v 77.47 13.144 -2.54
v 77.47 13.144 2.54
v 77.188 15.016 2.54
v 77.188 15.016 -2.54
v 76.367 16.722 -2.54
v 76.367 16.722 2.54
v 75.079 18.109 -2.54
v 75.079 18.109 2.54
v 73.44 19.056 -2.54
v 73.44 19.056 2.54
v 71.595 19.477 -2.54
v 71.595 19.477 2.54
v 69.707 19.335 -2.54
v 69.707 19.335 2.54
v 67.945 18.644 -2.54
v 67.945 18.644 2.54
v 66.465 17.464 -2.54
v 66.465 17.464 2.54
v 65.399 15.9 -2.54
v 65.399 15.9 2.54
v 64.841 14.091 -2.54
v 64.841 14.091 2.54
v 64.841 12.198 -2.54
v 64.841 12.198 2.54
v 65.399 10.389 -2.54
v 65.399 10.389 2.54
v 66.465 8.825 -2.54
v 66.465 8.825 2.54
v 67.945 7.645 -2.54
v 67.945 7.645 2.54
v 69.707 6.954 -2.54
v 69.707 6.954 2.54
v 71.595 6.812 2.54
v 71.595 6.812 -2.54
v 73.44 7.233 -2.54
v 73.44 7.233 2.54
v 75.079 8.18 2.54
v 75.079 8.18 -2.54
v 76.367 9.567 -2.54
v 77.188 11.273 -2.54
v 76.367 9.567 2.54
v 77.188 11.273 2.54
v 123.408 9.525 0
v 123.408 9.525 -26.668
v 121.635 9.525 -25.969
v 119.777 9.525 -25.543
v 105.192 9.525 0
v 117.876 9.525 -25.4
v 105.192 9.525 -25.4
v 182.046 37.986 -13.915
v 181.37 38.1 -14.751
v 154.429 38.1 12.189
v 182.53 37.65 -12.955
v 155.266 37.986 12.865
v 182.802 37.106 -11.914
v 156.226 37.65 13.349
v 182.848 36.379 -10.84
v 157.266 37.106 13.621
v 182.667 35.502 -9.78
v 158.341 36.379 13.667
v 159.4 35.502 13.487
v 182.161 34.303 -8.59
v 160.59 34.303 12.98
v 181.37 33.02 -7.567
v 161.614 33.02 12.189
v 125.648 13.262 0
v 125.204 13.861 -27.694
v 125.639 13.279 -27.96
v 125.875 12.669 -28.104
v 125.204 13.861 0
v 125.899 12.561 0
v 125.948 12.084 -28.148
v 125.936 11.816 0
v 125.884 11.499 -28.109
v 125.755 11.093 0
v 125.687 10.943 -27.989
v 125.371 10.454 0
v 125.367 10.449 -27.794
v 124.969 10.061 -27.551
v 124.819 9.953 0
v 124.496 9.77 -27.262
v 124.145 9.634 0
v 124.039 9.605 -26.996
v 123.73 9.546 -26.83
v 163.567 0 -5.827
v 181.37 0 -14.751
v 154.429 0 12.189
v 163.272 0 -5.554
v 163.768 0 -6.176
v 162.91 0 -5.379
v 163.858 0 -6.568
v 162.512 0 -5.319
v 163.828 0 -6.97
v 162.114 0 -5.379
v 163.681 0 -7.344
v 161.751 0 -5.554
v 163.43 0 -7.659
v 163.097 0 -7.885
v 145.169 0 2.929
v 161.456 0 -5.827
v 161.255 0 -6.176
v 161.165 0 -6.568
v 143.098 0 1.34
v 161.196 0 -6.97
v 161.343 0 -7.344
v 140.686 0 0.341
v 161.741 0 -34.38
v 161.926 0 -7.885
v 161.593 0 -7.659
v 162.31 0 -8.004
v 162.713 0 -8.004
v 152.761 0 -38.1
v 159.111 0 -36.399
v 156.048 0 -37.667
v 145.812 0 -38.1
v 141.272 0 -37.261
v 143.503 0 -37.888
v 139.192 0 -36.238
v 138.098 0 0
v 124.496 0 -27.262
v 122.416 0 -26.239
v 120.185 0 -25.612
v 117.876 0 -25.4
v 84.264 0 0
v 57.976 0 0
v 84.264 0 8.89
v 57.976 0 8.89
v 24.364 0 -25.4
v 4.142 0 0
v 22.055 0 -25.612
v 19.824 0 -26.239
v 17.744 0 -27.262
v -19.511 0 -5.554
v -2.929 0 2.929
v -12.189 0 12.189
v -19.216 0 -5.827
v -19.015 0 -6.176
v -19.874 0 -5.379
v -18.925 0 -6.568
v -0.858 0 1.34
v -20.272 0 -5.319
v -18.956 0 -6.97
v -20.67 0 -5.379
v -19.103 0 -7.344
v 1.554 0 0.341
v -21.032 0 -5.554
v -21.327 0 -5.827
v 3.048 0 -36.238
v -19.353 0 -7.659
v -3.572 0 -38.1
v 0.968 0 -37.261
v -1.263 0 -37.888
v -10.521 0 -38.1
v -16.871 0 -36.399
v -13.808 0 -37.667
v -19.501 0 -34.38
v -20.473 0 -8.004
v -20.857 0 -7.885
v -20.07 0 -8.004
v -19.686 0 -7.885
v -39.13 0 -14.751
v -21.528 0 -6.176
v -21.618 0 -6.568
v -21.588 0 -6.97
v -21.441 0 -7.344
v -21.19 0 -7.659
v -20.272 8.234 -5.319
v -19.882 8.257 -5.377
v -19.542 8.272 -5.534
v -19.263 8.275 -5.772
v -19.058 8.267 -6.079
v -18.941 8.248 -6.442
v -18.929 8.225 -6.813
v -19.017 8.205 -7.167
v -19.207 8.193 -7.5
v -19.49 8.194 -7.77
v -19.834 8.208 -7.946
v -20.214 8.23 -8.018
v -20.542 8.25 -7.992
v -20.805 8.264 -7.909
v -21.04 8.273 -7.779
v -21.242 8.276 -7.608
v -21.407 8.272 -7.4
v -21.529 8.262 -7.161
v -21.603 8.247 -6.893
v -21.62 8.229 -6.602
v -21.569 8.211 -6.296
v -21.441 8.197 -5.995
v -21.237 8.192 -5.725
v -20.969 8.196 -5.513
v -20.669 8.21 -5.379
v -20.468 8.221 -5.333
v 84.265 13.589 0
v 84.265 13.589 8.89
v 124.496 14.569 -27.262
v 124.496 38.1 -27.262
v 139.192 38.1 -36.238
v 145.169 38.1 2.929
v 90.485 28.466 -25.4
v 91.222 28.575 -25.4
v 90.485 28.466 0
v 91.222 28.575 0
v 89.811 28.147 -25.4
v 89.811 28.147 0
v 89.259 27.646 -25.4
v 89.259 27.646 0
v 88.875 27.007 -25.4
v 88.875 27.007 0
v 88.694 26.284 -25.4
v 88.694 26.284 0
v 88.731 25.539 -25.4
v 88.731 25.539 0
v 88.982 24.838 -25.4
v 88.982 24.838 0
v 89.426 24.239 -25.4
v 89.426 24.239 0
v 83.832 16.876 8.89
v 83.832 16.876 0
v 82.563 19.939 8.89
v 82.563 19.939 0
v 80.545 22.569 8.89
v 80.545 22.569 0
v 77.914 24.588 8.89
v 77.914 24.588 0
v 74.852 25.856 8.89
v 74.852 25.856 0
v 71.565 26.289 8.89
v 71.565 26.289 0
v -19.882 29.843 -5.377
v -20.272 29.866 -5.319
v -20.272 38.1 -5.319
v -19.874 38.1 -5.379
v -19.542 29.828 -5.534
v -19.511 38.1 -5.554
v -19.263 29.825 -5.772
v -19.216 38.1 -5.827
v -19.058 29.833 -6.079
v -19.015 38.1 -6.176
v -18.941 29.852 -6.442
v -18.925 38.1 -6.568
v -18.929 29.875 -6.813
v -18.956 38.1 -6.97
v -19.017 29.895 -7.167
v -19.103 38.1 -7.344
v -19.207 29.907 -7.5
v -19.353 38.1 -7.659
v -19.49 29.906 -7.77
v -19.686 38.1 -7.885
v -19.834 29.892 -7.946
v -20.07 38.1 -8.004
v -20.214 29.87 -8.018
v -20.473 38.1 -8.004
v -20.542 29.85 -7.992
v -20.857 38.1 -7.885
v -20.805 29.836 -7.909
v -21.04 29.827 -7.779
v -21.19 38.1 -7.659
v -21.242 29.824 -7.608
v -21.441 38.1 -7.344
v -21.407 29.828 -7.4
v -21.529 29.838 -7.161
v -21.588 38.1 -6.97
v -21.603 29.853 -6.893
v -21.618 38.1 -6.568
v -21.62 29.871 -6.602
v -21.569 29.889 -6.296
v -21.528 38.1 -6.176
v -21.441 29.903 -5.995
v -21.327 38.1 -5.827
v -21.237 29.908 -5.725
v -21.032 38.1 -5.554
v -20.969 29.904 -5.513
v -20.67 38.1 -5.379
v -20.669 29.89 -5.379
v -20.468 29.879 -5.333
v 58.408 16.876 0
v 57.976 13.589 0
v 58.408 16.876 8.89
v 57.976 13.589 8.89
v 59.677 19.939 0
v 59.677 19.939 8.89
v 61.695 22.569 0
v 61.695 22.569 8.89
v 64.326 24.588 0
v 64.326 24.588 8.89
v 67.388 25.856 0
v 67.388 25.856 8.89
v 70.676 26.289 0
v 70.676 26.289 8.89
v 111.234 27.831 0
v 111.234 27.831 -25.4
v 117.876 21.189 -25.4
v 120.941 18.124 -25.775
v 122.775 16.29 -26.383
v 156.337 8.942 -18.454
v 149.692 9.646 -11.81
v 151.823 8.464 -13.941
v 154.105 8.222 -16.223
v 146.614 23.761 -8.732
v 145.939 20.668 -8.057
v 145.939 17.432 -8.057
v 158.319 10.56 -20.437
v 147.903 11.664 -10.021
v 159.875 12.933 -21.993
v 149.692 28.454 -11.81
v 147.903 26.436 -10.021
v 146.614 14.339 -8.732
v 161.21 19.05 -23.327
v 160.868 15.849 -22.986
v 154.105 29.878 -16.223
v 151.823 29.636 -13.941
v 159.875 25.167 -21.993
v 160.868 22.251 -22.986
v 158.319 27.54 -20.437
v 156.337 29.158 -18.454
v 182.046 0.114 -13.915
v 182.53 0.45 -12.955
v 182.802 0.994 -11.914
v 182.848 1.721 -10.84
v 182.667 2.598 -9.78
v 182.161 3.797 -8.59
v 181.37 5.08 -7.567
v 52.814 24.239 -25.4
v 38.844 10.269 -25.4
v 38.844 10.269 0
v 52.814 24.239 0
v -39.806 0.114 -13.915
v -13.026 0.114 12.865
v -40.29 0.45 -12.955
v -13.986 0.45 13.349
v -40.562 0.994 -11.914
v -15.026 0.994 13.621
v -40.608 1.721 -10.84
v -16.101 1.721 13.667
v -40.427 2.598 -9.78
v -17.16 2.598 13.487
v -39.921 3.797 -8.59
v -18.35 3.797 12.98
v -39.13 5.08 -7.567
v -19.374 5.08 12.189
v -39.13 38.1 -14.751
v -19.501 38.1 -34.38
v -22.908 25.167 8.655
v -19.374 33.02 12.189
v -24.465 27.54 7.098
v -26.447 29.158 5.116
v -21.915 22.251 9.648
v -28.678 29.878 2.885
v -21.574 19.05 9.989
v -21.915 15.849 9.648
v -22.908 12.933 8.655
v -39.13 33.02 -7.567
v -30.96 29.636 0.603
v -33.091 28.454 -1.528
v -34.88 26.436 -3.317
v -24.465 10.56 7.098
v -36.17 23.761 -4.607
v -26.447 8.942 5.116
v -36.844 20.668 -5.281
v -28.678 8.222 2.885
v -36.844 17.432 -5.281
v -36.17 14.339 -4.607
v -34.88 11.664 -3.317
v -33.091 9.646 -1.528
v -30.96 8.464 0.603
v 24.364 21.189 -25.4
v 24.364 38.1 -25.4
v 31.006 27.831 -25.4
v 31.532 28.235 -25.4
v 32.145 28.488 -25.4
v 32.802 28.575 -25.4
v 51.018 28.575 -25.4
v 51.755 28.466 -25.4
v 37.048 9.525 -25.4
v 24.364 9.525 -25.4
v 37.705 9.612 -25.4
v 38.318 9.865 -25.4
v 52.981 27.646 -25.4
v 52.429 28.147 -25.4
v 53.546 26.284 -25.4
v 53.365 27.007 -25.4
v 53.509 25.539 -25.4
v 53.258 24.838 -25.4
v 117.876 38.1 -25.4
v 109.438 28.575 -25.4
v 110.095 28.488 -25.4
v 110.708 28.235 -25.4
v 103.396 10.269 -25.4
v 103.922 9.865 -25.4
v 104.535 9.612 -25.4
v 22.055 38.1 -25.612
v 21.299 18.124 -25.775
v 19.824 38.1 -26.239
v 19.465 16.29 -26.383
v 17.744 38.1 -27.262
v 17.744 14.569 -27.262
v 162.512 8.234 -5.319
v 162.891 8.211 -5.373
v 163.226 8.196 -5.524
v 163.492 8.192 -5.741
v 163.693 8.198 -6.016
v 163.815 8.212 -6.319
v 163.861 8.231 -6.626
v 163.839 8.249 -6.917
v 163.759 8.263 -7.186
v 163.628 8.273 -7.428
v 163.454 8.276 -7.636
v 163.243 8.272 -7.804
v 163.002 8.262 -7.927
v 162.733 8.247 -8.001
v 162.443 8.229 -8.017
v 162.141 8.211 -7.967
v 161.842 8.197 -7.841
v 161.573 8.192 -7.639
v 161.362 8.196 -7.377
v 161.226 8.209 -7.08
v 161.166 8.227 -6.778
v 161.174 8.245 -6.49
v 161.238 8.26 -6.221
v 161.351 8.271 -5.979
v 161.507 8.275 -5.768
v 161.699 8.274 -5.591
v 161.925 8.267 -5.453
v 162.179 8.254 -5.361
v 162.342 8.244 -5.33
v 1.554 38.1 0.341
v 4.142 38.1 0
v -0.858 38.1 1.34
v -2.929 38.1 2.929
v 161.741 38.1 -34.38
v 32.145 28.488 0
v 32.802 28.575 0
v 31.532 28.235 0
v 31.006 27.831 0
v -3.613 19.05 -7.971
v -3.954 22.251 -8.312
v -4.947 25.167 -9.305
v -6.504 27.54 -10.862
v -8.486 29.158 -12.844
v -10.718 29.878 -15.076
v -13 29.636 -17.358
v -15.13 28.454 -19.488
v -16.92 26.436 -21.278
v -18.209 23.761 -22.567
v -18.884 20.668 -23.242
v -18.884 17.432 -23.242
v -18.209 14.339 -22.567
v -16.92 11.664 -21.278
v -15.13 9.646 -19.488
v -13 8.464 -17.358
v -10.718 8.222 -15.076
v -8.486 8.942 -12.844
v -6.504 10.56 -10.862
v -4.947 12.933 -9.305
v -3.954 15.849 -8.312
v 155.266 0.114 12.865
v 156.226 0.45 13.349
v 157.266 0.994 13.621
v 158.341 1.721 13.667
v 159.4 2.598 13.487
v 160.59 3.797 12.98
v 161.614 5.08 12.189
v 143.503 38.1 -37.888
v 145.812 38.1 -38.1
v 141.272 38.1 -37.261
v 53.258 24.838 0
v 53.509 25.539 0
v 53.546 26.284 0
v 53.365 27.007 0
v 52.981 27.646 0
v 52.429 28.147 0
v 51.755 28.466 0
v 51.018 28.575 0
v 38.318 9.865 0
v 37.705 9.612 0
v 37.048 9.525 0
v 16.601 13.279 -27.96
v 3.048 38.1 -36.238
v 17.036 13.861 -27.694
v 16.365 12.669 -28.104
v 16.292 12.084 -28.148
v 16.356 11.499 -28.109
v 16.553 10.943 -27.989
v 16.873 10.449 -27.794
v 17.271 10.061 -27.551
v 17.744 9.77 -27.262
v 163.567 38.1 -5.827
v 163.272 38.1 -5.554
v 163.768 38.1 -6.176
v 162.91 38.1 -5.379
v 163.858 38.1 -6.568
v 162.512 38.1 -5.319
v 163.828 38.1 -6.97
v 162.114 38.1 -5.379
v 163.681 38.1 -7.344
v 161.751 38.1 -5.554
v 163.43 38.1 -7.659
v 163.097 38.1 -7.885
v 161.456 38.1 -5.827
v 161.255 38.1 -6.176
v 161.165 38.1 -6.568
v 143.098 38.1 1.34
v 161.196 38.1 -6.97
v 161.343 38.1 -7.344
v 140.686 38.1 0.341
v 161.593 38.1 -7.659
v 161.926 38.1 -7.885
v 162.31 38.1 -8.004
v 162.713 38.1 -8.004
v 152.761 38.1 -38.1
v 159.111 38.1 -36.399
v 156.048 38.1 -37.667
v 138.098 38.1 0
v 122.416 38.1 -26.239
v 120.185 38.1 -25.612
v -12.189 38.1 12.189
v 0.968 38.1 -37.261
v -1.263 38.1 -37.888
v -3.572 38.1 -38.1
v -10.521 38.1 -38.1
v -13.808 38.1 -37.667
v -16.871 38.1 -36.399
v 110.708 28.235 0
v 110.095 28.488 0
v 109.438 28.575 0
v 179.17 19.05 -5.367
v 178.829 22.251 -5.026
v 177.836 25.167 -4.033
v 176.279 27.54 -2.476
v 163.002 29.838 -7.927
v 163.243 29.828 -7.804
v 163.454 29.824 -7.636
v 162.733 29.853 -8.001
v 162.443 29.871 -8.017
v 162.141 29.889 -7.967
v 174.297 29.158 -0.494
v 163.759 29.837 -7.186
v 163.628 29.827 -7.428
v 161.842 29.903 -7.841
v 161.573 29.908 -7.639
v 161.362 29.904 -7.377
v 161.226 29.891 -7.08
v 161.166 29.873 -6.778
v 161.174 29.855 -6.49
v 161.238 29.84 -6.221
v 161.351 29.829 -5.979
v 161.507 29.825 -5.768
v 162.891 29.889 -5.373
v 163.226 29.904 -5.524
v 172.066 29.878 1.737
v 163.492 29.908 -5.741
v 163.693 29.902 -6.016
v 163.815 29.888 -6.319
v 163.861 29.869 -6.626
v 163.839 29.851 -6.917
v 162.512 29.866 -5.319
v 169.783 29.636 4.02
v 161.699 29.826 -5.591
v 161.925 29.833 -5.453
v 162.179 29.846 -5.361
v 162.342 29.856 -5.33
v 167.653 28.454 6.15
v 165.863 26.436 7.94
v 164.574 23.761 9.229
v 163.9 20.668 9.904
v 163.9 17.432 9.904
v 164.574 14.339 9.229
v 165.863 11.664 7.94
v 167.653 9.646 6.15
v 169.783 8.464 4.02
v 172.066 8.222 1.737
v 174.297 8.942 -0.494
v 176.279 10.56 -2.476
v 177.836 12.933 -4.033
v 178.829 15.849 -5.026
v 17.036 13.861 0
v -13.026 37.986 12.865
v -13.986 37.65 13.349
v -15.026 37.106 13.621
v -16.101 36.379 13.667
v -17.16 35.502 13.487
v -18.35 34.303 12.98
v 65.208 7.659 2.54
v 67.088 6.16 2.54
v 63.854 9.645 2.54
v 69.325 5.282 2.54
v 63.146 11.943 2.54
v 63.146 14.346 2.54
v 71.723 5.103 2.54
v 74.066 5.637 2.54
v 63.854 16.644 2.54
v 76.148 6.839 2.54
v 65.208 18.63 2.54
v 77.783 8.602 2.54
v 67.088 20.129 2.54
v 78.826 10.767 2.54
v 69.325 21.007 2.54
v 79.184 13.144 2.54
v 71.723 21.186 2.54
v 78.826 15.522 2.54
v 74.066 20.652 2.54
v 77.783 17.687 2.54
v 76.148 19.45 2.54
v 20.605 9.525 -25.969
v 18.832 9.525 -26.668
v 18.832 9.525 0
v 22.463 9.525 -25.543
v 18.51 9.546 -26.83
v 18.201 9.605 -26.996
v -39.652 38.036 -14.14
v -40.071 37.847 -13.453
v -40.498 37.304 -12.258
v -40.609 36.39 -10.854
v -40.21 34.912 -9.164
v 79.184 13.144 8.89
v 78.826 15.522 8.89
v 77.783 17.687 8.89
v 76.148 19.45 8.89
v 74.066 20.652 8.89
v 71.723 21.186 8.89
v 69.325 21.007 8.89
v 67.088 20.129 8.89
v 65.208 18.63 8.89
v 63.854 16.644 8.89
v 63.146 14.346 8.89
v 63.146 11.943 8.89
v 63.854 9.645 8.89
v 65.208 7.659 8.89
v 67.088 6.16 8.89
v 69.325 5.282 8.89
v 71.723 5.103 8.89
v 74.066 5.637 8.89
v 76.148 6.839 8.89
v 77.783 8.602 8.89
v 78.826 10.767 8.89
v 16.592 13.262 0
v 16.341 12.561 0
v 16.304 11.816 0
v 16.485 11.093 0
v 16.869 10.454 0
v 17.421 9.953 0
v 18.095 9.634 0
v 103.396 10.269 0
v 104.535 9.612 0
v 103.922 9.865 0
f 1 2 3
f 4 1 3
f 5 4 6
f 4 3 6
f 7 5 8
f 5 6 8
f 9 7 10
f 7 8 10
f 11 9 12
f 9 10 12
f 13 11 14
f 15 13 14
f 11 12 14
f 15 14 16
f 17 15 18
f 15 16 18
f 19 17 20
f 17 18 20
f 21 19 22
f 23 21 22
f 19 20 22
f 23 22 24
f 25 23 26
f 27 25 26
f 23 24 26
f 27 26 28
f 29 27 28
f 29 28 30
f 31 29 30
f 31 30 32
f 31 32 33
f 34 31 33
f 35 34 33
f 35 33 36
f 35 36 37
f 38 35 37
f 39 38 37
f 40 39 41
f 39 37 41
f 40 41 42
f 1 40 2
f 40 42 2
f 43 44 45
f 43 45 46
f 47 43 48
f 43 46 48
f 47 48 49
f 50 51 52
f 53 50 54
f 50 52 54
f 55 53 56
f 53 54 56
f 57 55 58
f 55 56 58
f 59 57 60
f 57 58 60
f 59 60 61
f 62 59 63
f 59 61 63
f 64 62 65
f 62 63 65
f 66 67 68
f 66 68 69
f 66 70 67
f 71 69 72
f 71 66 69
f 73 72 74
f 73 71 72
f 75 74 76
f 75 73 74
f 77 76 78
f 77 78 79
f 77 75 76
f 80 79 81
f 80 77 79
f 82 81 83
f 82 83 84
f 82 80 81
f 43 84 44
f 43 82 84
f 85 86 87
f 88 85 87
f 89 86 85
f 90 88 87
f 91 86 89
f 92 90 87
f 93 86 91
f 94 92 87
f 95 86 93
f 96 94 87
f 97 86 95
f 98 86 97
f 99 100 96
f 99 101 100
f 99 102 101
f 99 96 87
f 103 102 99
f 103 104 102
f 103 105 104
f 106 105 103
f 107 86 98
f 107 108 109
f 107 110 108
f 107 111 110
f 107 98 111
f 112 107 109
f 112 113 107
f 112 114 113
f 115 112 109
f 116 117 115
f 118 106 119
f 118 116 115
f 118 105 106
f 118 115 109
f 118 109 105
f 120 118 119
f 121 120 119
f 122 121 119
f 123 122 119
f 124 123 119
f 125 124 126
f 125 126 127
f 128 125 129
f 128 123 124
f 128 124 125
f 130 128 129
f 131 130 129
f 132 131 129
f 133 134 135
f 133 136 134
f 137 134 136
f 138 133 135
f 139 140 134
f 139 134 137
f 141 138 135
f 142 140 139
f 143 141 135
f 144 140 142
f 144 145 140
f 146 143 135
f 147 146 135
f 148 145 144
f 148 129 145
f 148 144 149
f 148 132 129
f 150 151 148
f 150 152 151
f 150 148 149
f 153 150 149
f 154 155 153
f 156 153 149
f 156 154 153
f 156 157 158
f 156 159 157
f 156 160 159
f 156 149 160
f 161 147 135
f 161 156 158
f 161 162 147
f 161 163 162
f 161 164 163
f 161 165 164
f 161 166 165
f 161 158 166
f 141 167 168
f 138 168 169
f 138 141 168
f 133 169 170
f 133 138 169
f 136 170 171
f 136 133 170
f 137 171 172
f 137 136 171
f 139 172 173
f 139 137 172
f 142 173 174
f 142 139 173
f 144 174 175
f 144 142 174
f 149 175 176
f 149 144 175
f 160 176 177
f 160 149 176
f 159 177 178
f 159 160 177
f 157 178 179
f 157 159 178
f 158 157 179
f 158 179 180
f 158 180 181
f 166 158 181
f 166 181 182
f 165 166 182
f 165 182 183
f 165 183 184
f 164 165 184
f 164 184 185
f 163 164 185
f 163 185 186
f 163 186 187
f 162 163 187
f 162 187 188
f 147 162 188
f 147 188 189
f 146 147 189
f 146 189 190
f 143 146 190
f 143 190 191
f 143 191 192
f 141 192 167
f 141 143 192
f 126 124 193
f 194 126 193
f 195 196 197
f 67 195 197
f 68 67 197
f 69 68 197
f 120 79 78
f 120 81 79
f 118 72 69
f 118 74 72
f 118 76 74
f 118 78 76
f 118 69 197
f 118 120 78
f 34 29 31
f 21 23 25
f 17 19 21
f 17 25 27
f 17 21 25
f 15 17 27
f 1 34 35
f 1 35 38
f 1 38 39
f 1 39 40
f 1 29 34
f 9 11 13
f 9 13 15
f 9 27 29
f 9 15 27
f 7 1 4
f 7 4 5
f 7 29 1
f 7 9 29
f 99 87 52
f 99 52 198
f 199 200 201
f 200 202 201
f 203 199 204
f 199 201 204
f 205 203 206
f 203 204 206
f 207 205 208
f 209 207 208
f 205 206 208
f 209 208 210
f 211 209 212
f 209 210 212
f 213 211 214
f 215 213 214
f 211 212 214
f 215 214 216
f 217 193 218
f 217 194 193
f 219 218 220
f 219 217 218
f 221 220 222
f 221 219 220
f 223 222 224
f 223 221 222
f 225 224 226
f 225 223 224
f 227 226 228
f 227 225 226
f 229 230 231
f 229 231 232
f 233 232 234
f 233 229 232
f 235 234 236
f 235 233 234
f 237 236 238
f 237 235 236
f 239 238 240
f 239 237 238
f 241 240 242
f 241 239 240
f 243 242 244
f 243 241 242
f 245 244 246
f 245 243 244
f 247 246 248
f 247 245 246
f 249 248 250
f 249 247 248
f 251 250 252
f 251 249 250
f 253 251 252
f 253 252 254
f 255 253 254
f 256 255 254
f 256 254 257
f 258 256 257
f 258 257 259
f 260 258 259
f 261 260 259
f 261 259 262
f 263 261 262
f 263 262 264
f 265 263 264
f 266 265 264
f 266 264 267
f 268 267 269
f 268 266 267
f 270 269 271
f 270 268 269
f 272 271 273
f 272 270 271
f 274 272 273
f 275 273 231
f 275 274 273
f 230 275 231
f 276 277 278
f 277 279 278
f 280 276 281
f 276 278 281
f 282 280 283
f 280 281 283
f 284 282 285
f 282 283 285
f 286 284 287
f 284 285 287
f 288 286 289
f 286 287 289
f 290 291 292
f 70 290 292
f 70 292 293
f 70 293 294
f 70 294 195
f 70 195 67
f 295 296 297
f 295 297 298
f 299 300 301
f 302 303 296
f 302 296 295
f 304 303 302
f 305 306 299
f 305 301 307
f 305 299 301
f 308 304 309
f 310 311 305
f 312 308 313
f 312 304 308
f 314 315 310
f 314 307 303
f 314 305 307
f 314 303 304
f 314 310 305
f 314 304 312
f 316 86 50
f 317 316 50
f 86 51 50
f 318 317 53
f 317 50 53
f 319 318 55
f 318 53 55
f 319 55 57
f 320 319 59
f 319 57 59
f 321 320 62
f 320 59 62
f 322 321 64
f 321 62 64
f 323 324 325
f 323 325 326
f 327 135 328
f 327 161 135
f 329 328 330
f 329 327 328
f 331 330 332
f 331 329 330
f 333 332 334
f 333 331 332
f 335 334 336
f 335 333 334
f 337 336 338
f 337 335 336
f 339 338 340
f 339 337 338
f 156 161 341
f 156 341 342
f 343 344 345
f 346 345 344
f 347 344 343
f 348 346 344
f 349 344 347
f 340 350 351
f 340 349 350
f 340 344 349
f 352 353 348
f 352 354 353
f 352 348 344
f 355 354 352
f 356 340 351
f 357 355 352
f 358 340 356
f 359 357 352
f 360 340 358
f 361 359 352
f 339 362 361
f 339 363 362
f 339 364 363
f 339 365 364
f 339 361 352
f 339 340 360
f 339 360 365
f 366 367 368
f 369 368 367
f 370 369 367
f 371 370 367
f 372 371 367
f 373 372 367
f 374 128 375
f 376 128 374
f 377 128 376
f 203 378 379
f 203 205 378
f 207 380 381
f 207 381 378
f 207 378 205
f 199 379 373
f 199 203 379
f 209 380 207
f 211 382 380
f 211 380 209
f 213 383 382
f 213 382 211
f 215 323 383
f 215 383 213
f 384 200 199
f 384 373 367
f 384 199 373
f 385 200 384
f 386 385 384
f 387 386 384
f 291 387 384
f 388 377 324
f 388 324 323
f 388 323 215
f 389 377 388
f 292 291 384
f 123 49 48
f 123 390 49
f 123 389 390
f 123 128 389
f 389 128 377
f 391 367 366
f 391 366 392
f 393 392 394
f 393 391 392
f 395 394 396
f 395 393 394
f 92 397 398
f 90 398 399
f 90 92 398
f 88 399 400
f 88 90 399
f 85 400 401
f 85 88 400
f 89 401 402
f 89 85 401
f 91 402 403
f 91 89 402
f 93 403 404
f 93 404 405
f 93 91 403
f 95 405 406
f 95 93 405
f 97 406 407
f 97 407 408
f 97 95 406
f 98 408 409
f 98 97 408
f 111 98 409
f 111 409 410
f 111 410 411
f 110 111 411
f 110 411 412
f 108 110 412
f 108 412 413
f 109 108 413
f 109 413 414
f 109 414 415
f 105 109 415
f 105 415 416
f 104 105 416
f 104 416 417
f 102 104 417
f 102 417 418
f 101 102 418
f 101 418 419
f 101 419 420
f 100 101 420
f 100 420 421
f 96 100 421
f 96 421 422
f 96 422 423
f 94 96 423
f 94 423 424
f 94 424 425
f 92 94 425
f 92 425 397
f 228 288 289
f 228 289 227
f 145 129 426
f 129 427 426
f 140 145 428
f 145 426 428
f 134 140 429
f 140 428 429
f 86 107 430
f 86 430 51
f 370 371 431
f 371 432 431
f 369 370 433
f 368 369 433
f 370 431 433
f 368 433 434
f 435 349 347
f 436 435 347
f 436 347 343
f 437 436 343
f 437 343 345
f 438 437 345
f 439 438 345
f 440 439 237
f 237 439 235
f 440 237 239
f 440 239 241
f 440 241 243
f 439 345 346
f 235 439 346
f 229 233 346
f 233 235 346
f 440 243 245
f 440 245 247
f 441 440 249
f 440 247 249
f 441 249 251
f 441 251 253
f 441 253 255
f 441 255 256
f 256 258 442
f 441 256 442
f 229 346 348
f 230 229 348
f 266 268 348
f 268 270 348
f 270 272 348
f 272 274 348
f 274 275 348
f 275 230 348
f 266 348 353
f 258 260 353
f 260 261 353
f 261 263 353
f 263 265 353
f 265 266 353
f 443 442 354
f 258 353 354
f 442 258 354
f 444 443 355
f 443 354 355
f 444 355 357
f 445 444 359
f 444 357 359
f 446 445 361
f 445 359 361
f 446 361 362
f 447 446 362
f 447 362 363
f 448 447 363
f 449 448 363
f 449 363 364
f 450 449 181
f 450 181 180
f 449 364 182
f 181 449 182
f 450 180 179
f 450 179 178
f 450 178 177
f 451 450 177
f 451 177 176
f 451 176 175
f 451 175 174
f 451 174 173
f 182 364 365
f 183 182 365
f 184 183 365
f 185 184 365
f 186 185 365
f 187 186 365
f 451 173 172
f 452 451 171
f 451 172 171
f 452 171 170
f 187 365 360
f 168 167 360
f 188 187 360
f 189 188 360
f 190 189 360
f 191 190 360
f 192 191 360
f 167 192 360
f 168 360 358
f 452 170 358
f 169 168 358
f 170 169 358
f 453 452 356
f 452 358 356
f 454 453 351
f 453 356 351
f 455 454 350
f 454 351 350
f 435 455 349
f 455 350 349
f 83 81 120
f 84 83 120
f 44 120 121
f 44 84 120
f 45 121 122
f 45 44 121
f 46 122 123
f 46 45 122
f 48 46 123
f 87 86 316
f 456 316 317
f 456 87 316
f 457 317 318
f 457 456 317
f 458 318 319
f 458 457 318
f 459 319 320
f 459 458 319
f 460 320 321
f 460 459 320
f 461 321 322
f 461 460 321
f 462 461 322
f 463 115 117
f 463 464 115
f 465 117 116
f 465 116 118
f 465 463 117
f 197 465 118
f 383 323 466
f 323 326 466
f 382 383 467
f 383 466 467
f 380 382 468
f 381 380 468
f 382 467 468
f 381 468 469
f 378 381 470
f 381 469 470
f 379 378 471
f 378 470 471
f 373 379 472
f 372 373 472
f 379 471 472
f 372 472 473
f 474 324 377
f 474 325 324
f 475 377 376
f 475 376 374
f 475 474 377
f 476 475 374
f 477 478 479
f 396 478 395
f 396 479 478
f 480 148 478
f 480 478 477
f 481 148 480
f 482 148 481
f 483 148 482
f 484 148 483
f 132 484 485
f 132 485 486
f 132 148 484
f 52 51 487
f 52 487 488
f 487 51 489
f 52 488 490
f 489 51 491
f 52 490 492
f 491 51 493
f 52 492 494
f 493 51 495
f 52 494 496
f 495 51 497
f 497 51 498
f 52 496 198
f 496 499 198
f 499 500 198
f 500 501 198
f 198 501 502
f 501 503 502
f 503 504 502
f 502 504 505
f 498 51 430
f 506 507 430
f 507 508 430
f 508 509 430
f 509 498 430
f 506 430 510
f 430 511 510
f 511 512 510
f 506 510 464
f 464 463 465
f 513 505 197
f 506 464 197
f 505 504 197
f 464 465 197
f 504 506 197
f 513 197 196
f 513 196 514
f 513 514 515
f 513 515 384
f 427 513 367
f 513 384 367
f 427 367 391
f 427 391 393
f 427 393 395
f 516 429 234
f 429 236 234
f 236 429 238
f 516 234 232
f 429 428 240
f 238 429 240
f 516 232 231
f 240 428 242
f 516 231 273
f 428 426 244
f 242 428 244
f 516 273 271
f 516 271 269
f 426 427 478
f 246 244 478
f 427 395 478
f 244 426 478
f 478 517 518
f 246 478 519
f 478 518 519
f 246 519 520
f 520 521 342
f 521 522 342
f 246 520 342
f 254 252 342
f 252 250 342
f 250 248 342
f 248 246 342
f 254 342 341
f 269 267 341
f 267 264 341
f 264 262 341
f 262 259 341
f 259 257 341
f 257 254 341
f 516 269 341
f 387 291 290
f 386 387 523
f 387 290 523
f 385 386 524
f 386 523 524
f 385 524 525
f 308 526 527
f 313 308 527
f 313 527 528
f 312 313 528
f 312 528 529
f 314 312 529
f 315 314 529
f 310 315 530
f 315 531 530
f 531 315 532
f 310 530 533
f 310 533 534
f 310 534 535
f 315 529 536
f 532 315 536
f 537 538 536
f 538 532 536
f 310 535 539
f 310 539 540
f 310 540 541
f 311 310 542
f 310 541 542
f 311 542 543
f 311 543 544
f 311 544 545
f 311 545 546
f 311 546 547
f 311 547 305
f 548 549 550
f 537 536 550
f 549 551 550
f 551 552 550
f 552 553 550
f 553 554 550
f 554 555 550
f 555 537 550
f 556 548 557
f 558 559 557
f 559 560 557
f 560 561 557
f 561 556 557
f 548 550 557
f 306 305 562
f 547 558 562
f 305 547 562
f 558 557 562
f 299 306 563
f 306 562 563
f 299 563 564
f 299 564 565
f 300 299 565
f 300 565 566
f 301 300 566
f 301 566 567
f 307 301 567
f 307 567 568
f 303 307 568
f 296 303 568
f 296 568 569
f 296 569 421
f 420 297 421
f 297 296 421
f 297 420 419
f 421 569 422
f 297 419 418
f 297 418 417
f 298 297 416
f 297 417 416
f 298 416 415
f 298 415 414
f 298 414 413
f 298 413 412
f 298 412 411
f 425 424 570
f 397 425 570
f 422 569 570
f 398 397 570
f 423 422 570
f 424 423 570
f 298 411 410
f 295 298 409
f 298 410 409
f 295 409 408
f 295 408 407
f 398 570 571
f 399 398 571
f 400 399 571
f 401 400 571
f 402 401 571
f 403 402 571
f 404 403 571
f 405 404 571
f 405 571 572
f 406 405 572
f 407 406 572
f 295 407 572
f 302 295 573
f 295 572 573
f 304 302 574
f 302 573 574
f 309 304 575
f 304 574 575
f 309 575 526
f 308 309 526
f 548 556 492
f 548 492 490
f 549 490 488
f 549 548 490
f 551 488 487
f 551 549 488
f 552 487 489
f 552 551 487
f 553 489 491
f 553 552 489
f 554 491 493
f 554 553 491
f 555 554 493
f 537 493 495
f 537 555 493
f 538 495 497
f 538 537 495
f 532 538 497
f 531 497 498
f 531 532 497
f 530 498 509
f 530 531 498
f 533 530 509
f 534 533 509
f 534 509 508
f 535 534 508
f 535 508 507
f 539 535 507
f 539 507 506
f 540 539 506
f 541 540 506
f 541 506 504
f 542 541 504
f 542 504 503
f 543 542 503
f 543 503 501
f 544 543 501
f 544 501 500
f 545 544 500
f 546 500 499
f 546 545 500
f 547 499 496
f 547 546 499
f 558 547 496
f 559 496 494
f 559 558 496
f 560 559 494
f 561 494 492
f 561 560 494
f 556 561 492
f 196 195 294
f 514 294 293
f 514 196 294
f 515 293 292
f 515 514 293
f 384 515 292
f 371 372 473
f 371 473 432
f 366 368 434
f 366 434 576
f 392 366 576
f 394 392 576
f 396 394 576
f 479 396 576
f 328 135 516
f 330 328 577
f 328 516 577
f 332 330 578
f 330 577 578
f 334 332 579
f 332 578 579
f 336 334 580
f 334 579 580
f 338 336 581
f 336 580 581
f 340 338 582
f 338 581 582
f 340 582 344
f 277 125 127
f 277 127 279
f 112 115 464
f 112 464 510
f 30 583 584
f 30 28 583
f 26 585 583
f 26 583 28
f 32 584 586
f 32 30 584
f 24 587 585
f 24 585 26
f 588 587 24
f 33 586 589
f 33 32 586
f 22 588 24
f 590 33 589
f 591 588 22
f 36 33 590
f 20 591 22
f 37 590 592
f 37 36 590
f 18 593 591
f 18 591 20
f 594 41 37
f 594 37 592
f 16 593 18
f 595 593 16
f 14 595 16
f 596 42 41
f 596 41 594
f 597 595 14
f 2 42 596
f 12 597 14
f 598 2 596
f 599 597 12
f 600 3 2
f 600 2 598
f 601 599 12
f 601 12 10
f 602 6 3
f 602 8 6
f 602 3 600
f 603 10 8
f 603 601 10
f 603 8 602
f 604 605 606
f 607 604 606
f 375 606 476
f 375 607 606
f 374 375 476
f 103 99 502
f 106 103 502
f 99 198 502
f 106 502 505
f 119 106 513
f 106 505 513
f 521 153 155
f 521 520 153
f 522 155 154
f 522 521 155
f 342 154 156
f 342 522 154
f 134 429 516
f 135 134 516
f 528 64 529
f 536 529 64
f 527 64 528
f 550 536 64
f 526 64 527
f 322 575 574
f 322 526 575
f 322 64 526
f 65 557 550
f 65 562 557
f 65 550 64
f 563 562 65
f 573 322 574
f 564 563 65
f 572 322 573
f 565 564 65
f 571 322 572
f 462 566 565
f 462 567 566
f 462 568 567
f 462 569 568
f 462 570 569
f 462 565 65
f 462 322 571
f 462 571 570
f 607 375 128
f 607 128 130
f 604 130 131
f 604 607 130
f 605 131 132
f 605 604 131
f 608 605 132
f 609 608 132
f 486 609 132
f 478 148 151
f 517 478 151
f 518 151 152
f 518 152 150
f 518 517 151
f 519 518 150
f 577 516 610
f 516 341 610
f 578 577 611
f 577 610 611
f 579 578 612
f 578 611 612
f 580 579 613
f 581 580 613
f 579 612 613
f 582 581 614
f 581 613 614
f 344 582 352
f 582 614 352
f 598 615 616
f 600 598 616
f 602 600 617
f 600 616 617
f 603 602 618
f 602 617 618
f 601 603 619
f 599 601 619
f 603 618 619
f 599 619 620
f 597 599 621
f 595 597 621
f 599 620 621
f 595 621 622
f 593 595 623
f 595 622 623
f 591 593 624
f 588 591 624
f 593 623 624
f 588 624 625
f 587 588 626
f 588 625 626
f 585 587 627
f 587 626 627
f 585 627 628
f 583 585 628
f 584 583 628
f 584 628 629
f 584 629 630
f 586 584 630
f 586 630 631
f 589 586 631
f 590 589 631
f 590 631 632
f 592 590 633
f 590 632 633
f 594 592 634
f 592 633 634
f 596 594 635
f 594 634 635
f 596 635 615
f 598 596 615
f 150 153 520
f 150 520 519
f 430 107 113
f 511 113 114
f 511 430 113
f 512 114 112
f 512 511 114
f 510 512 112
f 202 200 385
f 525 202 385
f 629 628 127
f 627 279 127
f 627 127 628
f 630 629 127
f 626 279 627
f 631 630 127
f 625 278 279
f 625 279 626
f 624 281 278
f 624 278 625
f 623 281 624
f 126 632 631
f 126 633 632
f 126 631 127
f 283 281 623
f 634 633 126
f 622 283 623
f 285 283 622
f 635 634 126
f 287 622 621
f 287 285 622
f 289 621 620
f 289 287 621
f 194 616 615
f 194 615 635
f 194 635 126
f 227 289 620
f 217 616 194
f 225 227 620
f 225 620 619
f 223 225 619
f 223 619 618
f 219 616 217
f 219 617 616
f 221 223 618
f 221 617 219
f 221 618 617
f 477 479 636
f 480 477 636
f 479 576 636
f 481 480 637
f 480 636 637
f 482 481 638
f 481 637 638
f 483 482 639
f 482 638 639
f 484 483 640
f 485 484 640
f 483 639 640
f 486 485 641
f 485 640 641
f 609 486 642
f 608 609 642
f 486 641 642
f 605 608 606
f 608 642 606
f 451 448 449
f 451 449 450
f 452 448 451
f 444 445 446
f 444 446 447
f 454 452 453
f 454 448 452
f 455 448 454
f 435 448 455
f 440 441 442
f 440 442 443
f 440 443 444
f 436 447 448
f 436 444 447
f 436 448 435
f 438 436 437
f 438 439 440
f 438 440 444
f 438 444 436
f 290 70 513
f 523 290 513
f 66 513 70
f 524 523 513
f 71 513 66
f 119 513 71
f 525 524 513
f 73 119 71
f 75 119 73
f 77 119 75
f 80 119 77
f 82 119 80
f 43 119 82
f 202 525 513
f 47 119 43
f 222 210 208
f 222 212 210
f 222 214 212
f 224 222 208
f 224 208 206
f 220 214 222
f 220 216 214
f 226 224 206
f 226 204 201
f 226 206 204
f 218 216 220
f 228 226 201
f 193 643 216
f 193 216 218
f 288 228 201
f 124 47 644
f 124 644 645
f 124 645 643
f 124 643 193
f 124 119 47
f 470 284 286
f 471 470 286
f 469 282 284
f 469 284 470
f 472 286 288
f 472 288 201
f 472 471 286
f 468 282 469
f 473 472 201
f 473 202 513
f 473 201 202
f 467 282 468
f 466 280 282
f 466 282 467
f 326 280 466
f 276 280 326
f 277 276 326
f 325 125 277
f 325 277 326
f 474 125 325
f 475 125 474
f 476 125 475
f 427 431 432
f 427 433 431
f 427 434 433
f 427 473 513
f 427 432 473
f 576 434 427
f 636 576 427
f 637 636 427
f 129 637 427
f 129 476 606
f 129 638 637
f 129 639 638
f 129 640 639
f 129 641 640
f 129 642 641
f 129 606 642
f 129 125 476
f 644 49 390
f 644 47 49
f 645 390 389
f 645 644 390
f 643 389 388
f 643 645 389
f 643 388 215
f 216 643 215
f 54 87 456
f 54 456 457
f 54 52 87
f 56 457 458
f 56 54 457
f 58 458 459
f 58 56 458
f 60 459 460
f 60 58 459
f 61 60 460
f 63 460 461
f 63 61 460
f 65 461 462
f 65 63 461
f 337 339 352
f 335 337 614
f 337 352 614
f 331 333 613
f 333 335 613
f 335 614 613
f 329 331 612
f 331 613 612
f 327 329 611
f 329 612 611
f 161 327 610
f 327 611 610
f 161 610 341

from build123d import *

# Parameters (mm, degrees)
BOSS_EXTRUDE1_DEPTH     = 38.1
SKETCH2_R               = 10.8585
CUT_EXTRUDE1_DEPTH      = 25.4
SKETCH3_R               = 10.8585
CUT_EXTRUDE2_DEPTH      = 25.4
FILLET1_R               = 10
SKETCH5_W               = 26.289
SKETCH5_H               = 26.289
BOSS_EXTRUDE2_DEPTH     = 8.89
SKETCH6_R               = 8.0645
CUT_EXTRUDE3_DEPTH      = 6.35
SKETCH7_R               = 6.35
CUT_EXTRUDE4_DEPTH      = 5.08
FILLET3_R               = 12.7
FILLET4_R               = 5.08
FILLET5_R               = 12.7
CUT_EXTRUDE5_DEPTH      = 191.631332173
CUT_EXTRUDE5_DEPTH_BACK = 191.631332173
SKETCH8_R               = 1.349999967
CUT_EXTRUDE6_DEPTH      = 191.631332193
CUT_EXTRUDE6_DEPTH_BACK = 191.631332193
FILLET6_R               = 2.54


with BuildPart() as part:
    # Sketch1 → Boss-Extrude1 (new body)
    with BuildSketch(Plane(origin=(0, 0, 0), x_dir=(1, 0, 0), z_dir=(0, 1, 0))):
        Polygon((-15.781536726, 38.1), (0, 38.1), (20.791856291, 25.4), (121.448143709, 25.4), (142.24, 38.1), (158.021536726, 38.1), (184.96230509, 11.159231637), (158.021536726, -15.781536726), (142.24, 0), (0, 0), (-15.781536726, -15.781536726), (-42.72230509, 11.159231637), align=None)
    extrude(amount=BOSS_EXTRUDE1_DEPTH)

    # Sketch2 → Cut-Extrude1 (cut)
    with BuildSketch(Plane(origin=(-15.781536726, 0, 15.781536726), x_dir=(0.7071067811865477, 0, 0.7071067811865475), z_dir=(-0.7071067811865475, 0, 0.7071067811865477))):
        with Locations((-19.05, 19.05)):
            Circle(SKETCH2_R)
    extrude(amount=-CUT_EXTRUDE1_DEPTH, mode=Mode.SUBTRACT)

    # Sketch3 → Cut-Extrude2 (cut)
    with BuildSketch(Plane(origin=(86.901536726, 0, 86.901536726), x_dir=(0.7071067811865478, 0, -0.7071067811865474), z_dir=(0.7071067811865474, 0, 0.7071067811865478))):
        with Locations((119.628868556, 19.05)):
            Circle(SKETCH3_R)
    extrude(amount=-CUT_EXTRUDE2_DEPTH, mode=Mode.SUBTRACT)

    # Fillet1
    fillet1_edges = [part.edges().sort_by_distance(p)[0] for p in [
        (142.24, 19.05, 0),
        (0, 19.05, 0),
    ]]
    fillet(fillet1_edges, radius=FILLET1_R)

    # Sketch5 → Boss-Extrude2 (add)
    with BuildSketch(Plane.XY):
        with Locations((71.12, 13.1445)):
            Rectangle(SKETCH5_W, SKETCH5_H)
    extrude(amount=BOSS_EXTRUDE2_DEPTH)

    # Sketch6 → Cut-Extrude3 (cut)
    with BuildSketch(Plane.XY.offset(8.89)):
        with Locations((71.12, 13.1445)):
            Circle(SKETCH6_R)
    extrude(amount=-CUT_EXTRUDE3_DEPTH, mode=Mode.SUBTRACT)

    # Sketch7 → Cut-Extrude4 (cut)
    with BuildSketch(Plane.XY.offset(2.54)):
        with Locations((71.12, 13.1445)):
            Circle(SKETCH7_R)
    extrude(amount=-CUT_EXTRUDE4_DEPTH, mode=Mode.SUBTRACT)

    # Fillet3
    fillet3_edges = [part.edges().sort_by_distance(p)[0] for p in [
        (57.9755, 26.289, 4.445),
        (84.2645, 26.289, 4.445),
    ]]
    fillet(fillet3_edges, radius=FILLET3_R)

    # Fillet4
    fillet4_edges = [part.edges().sort_by_distance(p)[0] for p in [
        (-29.251920908, 0, 2.311152545),
        (171.491920908, 0, 2.311152545),
        (171.491920908, 38.1, 2.311152545),
        (-15.781536726, 19.05, 15.781536726),
        (-42.72230509, 19.05, -11.159231637),
        (184.96230509, 19.05, -11.159231637),
        (158.021536726, 19.05, 15.781536726),
        (-29.251920908, 38.1, 2.311152545),
    ]]
    fillet(fillet4_edges, radius=FILLET4_R)

    # Fillet5
    fillet5_edges = [part.edges().sort_by_distance(p)[0] for p in [
        (-15.781536726, 19.05, -38.1),
        (0, 19.05, -38.1),
        (20.791856291, 19.05, -25.4),
        (121.448143709, 19.05, -25.4),
        (142.24, 19.05, -38.1),
        (158.021536726, 19.05, -38.1),
    ]]
    fillet(fillet5_edges, radius=FILLET5_R)

    # Sketch8 → Cut-Extrude5 (cut, two sides: drawn at the far end of the back side and taken through both)
    with BuildSketch(Plane(origin=(0, 38.1, 0), x_dir=(1, 0, 0), z_dir=(0, 1, 0)).offset(-CUT_EXTRUDE5_DEPTH_BACK)):
        with Locations(Location((-20.271664787, 6.669103576, 0), (0, 0, 270))):
            Circle(SKETCH8_R)
        with Locations(Location((162.511664787, 6.669103576, 0), (0, 0, 270))):
            Circle(SKETCH8_R)
    extrude(amount=CUT_EXTRUDE5_DEPTH + CUT_EXTRUDE5_DEPTH_BACK, mode=Mode.SUBTRACT)

    # Sketch9 → Cut-Extrude6 (cut, two sides: drawn at the far end of the back side and taken through both)
    with BuildSketch(Plane.XY.offset(-CUT_EXTRUDE6_DEPTH_BACK)):
        Polygon((12.7, 9.525), (38.1, 9.525), (57.15, 28.575), (31.75, 28.575), align=None)
        Polygon((85.09, 28.575), (110.49, 28.575), (129.54, 9.525), (104.14, 9.525), align=None)
    extrude(amount=CUT_EXTRUDE6_DEPTH + CUT_EXTRUDE6_DEPTH_BACK, mode=Mode.SUBTRACT)

    # Fillet6
    fillet6_edges = [part.edges().sort_by_distance(p)[0] for p in [
        (129.54, 9.525, -15.17131794),
        (110.49, 28.575, -12.7),
        (85.09, 28.575, -12.7),
        (104.14, 9.525, -12.7),
        (38.1, 9.525, -12.7),
        (57.15, 28.575, -12.7),
        (31.75, 28.575, -12.7),
        (12.7, 9.525, -15.17131794),
    ]]
    fillet(fillet6_edges, radius=FILLET6_R)


solid = part.part
